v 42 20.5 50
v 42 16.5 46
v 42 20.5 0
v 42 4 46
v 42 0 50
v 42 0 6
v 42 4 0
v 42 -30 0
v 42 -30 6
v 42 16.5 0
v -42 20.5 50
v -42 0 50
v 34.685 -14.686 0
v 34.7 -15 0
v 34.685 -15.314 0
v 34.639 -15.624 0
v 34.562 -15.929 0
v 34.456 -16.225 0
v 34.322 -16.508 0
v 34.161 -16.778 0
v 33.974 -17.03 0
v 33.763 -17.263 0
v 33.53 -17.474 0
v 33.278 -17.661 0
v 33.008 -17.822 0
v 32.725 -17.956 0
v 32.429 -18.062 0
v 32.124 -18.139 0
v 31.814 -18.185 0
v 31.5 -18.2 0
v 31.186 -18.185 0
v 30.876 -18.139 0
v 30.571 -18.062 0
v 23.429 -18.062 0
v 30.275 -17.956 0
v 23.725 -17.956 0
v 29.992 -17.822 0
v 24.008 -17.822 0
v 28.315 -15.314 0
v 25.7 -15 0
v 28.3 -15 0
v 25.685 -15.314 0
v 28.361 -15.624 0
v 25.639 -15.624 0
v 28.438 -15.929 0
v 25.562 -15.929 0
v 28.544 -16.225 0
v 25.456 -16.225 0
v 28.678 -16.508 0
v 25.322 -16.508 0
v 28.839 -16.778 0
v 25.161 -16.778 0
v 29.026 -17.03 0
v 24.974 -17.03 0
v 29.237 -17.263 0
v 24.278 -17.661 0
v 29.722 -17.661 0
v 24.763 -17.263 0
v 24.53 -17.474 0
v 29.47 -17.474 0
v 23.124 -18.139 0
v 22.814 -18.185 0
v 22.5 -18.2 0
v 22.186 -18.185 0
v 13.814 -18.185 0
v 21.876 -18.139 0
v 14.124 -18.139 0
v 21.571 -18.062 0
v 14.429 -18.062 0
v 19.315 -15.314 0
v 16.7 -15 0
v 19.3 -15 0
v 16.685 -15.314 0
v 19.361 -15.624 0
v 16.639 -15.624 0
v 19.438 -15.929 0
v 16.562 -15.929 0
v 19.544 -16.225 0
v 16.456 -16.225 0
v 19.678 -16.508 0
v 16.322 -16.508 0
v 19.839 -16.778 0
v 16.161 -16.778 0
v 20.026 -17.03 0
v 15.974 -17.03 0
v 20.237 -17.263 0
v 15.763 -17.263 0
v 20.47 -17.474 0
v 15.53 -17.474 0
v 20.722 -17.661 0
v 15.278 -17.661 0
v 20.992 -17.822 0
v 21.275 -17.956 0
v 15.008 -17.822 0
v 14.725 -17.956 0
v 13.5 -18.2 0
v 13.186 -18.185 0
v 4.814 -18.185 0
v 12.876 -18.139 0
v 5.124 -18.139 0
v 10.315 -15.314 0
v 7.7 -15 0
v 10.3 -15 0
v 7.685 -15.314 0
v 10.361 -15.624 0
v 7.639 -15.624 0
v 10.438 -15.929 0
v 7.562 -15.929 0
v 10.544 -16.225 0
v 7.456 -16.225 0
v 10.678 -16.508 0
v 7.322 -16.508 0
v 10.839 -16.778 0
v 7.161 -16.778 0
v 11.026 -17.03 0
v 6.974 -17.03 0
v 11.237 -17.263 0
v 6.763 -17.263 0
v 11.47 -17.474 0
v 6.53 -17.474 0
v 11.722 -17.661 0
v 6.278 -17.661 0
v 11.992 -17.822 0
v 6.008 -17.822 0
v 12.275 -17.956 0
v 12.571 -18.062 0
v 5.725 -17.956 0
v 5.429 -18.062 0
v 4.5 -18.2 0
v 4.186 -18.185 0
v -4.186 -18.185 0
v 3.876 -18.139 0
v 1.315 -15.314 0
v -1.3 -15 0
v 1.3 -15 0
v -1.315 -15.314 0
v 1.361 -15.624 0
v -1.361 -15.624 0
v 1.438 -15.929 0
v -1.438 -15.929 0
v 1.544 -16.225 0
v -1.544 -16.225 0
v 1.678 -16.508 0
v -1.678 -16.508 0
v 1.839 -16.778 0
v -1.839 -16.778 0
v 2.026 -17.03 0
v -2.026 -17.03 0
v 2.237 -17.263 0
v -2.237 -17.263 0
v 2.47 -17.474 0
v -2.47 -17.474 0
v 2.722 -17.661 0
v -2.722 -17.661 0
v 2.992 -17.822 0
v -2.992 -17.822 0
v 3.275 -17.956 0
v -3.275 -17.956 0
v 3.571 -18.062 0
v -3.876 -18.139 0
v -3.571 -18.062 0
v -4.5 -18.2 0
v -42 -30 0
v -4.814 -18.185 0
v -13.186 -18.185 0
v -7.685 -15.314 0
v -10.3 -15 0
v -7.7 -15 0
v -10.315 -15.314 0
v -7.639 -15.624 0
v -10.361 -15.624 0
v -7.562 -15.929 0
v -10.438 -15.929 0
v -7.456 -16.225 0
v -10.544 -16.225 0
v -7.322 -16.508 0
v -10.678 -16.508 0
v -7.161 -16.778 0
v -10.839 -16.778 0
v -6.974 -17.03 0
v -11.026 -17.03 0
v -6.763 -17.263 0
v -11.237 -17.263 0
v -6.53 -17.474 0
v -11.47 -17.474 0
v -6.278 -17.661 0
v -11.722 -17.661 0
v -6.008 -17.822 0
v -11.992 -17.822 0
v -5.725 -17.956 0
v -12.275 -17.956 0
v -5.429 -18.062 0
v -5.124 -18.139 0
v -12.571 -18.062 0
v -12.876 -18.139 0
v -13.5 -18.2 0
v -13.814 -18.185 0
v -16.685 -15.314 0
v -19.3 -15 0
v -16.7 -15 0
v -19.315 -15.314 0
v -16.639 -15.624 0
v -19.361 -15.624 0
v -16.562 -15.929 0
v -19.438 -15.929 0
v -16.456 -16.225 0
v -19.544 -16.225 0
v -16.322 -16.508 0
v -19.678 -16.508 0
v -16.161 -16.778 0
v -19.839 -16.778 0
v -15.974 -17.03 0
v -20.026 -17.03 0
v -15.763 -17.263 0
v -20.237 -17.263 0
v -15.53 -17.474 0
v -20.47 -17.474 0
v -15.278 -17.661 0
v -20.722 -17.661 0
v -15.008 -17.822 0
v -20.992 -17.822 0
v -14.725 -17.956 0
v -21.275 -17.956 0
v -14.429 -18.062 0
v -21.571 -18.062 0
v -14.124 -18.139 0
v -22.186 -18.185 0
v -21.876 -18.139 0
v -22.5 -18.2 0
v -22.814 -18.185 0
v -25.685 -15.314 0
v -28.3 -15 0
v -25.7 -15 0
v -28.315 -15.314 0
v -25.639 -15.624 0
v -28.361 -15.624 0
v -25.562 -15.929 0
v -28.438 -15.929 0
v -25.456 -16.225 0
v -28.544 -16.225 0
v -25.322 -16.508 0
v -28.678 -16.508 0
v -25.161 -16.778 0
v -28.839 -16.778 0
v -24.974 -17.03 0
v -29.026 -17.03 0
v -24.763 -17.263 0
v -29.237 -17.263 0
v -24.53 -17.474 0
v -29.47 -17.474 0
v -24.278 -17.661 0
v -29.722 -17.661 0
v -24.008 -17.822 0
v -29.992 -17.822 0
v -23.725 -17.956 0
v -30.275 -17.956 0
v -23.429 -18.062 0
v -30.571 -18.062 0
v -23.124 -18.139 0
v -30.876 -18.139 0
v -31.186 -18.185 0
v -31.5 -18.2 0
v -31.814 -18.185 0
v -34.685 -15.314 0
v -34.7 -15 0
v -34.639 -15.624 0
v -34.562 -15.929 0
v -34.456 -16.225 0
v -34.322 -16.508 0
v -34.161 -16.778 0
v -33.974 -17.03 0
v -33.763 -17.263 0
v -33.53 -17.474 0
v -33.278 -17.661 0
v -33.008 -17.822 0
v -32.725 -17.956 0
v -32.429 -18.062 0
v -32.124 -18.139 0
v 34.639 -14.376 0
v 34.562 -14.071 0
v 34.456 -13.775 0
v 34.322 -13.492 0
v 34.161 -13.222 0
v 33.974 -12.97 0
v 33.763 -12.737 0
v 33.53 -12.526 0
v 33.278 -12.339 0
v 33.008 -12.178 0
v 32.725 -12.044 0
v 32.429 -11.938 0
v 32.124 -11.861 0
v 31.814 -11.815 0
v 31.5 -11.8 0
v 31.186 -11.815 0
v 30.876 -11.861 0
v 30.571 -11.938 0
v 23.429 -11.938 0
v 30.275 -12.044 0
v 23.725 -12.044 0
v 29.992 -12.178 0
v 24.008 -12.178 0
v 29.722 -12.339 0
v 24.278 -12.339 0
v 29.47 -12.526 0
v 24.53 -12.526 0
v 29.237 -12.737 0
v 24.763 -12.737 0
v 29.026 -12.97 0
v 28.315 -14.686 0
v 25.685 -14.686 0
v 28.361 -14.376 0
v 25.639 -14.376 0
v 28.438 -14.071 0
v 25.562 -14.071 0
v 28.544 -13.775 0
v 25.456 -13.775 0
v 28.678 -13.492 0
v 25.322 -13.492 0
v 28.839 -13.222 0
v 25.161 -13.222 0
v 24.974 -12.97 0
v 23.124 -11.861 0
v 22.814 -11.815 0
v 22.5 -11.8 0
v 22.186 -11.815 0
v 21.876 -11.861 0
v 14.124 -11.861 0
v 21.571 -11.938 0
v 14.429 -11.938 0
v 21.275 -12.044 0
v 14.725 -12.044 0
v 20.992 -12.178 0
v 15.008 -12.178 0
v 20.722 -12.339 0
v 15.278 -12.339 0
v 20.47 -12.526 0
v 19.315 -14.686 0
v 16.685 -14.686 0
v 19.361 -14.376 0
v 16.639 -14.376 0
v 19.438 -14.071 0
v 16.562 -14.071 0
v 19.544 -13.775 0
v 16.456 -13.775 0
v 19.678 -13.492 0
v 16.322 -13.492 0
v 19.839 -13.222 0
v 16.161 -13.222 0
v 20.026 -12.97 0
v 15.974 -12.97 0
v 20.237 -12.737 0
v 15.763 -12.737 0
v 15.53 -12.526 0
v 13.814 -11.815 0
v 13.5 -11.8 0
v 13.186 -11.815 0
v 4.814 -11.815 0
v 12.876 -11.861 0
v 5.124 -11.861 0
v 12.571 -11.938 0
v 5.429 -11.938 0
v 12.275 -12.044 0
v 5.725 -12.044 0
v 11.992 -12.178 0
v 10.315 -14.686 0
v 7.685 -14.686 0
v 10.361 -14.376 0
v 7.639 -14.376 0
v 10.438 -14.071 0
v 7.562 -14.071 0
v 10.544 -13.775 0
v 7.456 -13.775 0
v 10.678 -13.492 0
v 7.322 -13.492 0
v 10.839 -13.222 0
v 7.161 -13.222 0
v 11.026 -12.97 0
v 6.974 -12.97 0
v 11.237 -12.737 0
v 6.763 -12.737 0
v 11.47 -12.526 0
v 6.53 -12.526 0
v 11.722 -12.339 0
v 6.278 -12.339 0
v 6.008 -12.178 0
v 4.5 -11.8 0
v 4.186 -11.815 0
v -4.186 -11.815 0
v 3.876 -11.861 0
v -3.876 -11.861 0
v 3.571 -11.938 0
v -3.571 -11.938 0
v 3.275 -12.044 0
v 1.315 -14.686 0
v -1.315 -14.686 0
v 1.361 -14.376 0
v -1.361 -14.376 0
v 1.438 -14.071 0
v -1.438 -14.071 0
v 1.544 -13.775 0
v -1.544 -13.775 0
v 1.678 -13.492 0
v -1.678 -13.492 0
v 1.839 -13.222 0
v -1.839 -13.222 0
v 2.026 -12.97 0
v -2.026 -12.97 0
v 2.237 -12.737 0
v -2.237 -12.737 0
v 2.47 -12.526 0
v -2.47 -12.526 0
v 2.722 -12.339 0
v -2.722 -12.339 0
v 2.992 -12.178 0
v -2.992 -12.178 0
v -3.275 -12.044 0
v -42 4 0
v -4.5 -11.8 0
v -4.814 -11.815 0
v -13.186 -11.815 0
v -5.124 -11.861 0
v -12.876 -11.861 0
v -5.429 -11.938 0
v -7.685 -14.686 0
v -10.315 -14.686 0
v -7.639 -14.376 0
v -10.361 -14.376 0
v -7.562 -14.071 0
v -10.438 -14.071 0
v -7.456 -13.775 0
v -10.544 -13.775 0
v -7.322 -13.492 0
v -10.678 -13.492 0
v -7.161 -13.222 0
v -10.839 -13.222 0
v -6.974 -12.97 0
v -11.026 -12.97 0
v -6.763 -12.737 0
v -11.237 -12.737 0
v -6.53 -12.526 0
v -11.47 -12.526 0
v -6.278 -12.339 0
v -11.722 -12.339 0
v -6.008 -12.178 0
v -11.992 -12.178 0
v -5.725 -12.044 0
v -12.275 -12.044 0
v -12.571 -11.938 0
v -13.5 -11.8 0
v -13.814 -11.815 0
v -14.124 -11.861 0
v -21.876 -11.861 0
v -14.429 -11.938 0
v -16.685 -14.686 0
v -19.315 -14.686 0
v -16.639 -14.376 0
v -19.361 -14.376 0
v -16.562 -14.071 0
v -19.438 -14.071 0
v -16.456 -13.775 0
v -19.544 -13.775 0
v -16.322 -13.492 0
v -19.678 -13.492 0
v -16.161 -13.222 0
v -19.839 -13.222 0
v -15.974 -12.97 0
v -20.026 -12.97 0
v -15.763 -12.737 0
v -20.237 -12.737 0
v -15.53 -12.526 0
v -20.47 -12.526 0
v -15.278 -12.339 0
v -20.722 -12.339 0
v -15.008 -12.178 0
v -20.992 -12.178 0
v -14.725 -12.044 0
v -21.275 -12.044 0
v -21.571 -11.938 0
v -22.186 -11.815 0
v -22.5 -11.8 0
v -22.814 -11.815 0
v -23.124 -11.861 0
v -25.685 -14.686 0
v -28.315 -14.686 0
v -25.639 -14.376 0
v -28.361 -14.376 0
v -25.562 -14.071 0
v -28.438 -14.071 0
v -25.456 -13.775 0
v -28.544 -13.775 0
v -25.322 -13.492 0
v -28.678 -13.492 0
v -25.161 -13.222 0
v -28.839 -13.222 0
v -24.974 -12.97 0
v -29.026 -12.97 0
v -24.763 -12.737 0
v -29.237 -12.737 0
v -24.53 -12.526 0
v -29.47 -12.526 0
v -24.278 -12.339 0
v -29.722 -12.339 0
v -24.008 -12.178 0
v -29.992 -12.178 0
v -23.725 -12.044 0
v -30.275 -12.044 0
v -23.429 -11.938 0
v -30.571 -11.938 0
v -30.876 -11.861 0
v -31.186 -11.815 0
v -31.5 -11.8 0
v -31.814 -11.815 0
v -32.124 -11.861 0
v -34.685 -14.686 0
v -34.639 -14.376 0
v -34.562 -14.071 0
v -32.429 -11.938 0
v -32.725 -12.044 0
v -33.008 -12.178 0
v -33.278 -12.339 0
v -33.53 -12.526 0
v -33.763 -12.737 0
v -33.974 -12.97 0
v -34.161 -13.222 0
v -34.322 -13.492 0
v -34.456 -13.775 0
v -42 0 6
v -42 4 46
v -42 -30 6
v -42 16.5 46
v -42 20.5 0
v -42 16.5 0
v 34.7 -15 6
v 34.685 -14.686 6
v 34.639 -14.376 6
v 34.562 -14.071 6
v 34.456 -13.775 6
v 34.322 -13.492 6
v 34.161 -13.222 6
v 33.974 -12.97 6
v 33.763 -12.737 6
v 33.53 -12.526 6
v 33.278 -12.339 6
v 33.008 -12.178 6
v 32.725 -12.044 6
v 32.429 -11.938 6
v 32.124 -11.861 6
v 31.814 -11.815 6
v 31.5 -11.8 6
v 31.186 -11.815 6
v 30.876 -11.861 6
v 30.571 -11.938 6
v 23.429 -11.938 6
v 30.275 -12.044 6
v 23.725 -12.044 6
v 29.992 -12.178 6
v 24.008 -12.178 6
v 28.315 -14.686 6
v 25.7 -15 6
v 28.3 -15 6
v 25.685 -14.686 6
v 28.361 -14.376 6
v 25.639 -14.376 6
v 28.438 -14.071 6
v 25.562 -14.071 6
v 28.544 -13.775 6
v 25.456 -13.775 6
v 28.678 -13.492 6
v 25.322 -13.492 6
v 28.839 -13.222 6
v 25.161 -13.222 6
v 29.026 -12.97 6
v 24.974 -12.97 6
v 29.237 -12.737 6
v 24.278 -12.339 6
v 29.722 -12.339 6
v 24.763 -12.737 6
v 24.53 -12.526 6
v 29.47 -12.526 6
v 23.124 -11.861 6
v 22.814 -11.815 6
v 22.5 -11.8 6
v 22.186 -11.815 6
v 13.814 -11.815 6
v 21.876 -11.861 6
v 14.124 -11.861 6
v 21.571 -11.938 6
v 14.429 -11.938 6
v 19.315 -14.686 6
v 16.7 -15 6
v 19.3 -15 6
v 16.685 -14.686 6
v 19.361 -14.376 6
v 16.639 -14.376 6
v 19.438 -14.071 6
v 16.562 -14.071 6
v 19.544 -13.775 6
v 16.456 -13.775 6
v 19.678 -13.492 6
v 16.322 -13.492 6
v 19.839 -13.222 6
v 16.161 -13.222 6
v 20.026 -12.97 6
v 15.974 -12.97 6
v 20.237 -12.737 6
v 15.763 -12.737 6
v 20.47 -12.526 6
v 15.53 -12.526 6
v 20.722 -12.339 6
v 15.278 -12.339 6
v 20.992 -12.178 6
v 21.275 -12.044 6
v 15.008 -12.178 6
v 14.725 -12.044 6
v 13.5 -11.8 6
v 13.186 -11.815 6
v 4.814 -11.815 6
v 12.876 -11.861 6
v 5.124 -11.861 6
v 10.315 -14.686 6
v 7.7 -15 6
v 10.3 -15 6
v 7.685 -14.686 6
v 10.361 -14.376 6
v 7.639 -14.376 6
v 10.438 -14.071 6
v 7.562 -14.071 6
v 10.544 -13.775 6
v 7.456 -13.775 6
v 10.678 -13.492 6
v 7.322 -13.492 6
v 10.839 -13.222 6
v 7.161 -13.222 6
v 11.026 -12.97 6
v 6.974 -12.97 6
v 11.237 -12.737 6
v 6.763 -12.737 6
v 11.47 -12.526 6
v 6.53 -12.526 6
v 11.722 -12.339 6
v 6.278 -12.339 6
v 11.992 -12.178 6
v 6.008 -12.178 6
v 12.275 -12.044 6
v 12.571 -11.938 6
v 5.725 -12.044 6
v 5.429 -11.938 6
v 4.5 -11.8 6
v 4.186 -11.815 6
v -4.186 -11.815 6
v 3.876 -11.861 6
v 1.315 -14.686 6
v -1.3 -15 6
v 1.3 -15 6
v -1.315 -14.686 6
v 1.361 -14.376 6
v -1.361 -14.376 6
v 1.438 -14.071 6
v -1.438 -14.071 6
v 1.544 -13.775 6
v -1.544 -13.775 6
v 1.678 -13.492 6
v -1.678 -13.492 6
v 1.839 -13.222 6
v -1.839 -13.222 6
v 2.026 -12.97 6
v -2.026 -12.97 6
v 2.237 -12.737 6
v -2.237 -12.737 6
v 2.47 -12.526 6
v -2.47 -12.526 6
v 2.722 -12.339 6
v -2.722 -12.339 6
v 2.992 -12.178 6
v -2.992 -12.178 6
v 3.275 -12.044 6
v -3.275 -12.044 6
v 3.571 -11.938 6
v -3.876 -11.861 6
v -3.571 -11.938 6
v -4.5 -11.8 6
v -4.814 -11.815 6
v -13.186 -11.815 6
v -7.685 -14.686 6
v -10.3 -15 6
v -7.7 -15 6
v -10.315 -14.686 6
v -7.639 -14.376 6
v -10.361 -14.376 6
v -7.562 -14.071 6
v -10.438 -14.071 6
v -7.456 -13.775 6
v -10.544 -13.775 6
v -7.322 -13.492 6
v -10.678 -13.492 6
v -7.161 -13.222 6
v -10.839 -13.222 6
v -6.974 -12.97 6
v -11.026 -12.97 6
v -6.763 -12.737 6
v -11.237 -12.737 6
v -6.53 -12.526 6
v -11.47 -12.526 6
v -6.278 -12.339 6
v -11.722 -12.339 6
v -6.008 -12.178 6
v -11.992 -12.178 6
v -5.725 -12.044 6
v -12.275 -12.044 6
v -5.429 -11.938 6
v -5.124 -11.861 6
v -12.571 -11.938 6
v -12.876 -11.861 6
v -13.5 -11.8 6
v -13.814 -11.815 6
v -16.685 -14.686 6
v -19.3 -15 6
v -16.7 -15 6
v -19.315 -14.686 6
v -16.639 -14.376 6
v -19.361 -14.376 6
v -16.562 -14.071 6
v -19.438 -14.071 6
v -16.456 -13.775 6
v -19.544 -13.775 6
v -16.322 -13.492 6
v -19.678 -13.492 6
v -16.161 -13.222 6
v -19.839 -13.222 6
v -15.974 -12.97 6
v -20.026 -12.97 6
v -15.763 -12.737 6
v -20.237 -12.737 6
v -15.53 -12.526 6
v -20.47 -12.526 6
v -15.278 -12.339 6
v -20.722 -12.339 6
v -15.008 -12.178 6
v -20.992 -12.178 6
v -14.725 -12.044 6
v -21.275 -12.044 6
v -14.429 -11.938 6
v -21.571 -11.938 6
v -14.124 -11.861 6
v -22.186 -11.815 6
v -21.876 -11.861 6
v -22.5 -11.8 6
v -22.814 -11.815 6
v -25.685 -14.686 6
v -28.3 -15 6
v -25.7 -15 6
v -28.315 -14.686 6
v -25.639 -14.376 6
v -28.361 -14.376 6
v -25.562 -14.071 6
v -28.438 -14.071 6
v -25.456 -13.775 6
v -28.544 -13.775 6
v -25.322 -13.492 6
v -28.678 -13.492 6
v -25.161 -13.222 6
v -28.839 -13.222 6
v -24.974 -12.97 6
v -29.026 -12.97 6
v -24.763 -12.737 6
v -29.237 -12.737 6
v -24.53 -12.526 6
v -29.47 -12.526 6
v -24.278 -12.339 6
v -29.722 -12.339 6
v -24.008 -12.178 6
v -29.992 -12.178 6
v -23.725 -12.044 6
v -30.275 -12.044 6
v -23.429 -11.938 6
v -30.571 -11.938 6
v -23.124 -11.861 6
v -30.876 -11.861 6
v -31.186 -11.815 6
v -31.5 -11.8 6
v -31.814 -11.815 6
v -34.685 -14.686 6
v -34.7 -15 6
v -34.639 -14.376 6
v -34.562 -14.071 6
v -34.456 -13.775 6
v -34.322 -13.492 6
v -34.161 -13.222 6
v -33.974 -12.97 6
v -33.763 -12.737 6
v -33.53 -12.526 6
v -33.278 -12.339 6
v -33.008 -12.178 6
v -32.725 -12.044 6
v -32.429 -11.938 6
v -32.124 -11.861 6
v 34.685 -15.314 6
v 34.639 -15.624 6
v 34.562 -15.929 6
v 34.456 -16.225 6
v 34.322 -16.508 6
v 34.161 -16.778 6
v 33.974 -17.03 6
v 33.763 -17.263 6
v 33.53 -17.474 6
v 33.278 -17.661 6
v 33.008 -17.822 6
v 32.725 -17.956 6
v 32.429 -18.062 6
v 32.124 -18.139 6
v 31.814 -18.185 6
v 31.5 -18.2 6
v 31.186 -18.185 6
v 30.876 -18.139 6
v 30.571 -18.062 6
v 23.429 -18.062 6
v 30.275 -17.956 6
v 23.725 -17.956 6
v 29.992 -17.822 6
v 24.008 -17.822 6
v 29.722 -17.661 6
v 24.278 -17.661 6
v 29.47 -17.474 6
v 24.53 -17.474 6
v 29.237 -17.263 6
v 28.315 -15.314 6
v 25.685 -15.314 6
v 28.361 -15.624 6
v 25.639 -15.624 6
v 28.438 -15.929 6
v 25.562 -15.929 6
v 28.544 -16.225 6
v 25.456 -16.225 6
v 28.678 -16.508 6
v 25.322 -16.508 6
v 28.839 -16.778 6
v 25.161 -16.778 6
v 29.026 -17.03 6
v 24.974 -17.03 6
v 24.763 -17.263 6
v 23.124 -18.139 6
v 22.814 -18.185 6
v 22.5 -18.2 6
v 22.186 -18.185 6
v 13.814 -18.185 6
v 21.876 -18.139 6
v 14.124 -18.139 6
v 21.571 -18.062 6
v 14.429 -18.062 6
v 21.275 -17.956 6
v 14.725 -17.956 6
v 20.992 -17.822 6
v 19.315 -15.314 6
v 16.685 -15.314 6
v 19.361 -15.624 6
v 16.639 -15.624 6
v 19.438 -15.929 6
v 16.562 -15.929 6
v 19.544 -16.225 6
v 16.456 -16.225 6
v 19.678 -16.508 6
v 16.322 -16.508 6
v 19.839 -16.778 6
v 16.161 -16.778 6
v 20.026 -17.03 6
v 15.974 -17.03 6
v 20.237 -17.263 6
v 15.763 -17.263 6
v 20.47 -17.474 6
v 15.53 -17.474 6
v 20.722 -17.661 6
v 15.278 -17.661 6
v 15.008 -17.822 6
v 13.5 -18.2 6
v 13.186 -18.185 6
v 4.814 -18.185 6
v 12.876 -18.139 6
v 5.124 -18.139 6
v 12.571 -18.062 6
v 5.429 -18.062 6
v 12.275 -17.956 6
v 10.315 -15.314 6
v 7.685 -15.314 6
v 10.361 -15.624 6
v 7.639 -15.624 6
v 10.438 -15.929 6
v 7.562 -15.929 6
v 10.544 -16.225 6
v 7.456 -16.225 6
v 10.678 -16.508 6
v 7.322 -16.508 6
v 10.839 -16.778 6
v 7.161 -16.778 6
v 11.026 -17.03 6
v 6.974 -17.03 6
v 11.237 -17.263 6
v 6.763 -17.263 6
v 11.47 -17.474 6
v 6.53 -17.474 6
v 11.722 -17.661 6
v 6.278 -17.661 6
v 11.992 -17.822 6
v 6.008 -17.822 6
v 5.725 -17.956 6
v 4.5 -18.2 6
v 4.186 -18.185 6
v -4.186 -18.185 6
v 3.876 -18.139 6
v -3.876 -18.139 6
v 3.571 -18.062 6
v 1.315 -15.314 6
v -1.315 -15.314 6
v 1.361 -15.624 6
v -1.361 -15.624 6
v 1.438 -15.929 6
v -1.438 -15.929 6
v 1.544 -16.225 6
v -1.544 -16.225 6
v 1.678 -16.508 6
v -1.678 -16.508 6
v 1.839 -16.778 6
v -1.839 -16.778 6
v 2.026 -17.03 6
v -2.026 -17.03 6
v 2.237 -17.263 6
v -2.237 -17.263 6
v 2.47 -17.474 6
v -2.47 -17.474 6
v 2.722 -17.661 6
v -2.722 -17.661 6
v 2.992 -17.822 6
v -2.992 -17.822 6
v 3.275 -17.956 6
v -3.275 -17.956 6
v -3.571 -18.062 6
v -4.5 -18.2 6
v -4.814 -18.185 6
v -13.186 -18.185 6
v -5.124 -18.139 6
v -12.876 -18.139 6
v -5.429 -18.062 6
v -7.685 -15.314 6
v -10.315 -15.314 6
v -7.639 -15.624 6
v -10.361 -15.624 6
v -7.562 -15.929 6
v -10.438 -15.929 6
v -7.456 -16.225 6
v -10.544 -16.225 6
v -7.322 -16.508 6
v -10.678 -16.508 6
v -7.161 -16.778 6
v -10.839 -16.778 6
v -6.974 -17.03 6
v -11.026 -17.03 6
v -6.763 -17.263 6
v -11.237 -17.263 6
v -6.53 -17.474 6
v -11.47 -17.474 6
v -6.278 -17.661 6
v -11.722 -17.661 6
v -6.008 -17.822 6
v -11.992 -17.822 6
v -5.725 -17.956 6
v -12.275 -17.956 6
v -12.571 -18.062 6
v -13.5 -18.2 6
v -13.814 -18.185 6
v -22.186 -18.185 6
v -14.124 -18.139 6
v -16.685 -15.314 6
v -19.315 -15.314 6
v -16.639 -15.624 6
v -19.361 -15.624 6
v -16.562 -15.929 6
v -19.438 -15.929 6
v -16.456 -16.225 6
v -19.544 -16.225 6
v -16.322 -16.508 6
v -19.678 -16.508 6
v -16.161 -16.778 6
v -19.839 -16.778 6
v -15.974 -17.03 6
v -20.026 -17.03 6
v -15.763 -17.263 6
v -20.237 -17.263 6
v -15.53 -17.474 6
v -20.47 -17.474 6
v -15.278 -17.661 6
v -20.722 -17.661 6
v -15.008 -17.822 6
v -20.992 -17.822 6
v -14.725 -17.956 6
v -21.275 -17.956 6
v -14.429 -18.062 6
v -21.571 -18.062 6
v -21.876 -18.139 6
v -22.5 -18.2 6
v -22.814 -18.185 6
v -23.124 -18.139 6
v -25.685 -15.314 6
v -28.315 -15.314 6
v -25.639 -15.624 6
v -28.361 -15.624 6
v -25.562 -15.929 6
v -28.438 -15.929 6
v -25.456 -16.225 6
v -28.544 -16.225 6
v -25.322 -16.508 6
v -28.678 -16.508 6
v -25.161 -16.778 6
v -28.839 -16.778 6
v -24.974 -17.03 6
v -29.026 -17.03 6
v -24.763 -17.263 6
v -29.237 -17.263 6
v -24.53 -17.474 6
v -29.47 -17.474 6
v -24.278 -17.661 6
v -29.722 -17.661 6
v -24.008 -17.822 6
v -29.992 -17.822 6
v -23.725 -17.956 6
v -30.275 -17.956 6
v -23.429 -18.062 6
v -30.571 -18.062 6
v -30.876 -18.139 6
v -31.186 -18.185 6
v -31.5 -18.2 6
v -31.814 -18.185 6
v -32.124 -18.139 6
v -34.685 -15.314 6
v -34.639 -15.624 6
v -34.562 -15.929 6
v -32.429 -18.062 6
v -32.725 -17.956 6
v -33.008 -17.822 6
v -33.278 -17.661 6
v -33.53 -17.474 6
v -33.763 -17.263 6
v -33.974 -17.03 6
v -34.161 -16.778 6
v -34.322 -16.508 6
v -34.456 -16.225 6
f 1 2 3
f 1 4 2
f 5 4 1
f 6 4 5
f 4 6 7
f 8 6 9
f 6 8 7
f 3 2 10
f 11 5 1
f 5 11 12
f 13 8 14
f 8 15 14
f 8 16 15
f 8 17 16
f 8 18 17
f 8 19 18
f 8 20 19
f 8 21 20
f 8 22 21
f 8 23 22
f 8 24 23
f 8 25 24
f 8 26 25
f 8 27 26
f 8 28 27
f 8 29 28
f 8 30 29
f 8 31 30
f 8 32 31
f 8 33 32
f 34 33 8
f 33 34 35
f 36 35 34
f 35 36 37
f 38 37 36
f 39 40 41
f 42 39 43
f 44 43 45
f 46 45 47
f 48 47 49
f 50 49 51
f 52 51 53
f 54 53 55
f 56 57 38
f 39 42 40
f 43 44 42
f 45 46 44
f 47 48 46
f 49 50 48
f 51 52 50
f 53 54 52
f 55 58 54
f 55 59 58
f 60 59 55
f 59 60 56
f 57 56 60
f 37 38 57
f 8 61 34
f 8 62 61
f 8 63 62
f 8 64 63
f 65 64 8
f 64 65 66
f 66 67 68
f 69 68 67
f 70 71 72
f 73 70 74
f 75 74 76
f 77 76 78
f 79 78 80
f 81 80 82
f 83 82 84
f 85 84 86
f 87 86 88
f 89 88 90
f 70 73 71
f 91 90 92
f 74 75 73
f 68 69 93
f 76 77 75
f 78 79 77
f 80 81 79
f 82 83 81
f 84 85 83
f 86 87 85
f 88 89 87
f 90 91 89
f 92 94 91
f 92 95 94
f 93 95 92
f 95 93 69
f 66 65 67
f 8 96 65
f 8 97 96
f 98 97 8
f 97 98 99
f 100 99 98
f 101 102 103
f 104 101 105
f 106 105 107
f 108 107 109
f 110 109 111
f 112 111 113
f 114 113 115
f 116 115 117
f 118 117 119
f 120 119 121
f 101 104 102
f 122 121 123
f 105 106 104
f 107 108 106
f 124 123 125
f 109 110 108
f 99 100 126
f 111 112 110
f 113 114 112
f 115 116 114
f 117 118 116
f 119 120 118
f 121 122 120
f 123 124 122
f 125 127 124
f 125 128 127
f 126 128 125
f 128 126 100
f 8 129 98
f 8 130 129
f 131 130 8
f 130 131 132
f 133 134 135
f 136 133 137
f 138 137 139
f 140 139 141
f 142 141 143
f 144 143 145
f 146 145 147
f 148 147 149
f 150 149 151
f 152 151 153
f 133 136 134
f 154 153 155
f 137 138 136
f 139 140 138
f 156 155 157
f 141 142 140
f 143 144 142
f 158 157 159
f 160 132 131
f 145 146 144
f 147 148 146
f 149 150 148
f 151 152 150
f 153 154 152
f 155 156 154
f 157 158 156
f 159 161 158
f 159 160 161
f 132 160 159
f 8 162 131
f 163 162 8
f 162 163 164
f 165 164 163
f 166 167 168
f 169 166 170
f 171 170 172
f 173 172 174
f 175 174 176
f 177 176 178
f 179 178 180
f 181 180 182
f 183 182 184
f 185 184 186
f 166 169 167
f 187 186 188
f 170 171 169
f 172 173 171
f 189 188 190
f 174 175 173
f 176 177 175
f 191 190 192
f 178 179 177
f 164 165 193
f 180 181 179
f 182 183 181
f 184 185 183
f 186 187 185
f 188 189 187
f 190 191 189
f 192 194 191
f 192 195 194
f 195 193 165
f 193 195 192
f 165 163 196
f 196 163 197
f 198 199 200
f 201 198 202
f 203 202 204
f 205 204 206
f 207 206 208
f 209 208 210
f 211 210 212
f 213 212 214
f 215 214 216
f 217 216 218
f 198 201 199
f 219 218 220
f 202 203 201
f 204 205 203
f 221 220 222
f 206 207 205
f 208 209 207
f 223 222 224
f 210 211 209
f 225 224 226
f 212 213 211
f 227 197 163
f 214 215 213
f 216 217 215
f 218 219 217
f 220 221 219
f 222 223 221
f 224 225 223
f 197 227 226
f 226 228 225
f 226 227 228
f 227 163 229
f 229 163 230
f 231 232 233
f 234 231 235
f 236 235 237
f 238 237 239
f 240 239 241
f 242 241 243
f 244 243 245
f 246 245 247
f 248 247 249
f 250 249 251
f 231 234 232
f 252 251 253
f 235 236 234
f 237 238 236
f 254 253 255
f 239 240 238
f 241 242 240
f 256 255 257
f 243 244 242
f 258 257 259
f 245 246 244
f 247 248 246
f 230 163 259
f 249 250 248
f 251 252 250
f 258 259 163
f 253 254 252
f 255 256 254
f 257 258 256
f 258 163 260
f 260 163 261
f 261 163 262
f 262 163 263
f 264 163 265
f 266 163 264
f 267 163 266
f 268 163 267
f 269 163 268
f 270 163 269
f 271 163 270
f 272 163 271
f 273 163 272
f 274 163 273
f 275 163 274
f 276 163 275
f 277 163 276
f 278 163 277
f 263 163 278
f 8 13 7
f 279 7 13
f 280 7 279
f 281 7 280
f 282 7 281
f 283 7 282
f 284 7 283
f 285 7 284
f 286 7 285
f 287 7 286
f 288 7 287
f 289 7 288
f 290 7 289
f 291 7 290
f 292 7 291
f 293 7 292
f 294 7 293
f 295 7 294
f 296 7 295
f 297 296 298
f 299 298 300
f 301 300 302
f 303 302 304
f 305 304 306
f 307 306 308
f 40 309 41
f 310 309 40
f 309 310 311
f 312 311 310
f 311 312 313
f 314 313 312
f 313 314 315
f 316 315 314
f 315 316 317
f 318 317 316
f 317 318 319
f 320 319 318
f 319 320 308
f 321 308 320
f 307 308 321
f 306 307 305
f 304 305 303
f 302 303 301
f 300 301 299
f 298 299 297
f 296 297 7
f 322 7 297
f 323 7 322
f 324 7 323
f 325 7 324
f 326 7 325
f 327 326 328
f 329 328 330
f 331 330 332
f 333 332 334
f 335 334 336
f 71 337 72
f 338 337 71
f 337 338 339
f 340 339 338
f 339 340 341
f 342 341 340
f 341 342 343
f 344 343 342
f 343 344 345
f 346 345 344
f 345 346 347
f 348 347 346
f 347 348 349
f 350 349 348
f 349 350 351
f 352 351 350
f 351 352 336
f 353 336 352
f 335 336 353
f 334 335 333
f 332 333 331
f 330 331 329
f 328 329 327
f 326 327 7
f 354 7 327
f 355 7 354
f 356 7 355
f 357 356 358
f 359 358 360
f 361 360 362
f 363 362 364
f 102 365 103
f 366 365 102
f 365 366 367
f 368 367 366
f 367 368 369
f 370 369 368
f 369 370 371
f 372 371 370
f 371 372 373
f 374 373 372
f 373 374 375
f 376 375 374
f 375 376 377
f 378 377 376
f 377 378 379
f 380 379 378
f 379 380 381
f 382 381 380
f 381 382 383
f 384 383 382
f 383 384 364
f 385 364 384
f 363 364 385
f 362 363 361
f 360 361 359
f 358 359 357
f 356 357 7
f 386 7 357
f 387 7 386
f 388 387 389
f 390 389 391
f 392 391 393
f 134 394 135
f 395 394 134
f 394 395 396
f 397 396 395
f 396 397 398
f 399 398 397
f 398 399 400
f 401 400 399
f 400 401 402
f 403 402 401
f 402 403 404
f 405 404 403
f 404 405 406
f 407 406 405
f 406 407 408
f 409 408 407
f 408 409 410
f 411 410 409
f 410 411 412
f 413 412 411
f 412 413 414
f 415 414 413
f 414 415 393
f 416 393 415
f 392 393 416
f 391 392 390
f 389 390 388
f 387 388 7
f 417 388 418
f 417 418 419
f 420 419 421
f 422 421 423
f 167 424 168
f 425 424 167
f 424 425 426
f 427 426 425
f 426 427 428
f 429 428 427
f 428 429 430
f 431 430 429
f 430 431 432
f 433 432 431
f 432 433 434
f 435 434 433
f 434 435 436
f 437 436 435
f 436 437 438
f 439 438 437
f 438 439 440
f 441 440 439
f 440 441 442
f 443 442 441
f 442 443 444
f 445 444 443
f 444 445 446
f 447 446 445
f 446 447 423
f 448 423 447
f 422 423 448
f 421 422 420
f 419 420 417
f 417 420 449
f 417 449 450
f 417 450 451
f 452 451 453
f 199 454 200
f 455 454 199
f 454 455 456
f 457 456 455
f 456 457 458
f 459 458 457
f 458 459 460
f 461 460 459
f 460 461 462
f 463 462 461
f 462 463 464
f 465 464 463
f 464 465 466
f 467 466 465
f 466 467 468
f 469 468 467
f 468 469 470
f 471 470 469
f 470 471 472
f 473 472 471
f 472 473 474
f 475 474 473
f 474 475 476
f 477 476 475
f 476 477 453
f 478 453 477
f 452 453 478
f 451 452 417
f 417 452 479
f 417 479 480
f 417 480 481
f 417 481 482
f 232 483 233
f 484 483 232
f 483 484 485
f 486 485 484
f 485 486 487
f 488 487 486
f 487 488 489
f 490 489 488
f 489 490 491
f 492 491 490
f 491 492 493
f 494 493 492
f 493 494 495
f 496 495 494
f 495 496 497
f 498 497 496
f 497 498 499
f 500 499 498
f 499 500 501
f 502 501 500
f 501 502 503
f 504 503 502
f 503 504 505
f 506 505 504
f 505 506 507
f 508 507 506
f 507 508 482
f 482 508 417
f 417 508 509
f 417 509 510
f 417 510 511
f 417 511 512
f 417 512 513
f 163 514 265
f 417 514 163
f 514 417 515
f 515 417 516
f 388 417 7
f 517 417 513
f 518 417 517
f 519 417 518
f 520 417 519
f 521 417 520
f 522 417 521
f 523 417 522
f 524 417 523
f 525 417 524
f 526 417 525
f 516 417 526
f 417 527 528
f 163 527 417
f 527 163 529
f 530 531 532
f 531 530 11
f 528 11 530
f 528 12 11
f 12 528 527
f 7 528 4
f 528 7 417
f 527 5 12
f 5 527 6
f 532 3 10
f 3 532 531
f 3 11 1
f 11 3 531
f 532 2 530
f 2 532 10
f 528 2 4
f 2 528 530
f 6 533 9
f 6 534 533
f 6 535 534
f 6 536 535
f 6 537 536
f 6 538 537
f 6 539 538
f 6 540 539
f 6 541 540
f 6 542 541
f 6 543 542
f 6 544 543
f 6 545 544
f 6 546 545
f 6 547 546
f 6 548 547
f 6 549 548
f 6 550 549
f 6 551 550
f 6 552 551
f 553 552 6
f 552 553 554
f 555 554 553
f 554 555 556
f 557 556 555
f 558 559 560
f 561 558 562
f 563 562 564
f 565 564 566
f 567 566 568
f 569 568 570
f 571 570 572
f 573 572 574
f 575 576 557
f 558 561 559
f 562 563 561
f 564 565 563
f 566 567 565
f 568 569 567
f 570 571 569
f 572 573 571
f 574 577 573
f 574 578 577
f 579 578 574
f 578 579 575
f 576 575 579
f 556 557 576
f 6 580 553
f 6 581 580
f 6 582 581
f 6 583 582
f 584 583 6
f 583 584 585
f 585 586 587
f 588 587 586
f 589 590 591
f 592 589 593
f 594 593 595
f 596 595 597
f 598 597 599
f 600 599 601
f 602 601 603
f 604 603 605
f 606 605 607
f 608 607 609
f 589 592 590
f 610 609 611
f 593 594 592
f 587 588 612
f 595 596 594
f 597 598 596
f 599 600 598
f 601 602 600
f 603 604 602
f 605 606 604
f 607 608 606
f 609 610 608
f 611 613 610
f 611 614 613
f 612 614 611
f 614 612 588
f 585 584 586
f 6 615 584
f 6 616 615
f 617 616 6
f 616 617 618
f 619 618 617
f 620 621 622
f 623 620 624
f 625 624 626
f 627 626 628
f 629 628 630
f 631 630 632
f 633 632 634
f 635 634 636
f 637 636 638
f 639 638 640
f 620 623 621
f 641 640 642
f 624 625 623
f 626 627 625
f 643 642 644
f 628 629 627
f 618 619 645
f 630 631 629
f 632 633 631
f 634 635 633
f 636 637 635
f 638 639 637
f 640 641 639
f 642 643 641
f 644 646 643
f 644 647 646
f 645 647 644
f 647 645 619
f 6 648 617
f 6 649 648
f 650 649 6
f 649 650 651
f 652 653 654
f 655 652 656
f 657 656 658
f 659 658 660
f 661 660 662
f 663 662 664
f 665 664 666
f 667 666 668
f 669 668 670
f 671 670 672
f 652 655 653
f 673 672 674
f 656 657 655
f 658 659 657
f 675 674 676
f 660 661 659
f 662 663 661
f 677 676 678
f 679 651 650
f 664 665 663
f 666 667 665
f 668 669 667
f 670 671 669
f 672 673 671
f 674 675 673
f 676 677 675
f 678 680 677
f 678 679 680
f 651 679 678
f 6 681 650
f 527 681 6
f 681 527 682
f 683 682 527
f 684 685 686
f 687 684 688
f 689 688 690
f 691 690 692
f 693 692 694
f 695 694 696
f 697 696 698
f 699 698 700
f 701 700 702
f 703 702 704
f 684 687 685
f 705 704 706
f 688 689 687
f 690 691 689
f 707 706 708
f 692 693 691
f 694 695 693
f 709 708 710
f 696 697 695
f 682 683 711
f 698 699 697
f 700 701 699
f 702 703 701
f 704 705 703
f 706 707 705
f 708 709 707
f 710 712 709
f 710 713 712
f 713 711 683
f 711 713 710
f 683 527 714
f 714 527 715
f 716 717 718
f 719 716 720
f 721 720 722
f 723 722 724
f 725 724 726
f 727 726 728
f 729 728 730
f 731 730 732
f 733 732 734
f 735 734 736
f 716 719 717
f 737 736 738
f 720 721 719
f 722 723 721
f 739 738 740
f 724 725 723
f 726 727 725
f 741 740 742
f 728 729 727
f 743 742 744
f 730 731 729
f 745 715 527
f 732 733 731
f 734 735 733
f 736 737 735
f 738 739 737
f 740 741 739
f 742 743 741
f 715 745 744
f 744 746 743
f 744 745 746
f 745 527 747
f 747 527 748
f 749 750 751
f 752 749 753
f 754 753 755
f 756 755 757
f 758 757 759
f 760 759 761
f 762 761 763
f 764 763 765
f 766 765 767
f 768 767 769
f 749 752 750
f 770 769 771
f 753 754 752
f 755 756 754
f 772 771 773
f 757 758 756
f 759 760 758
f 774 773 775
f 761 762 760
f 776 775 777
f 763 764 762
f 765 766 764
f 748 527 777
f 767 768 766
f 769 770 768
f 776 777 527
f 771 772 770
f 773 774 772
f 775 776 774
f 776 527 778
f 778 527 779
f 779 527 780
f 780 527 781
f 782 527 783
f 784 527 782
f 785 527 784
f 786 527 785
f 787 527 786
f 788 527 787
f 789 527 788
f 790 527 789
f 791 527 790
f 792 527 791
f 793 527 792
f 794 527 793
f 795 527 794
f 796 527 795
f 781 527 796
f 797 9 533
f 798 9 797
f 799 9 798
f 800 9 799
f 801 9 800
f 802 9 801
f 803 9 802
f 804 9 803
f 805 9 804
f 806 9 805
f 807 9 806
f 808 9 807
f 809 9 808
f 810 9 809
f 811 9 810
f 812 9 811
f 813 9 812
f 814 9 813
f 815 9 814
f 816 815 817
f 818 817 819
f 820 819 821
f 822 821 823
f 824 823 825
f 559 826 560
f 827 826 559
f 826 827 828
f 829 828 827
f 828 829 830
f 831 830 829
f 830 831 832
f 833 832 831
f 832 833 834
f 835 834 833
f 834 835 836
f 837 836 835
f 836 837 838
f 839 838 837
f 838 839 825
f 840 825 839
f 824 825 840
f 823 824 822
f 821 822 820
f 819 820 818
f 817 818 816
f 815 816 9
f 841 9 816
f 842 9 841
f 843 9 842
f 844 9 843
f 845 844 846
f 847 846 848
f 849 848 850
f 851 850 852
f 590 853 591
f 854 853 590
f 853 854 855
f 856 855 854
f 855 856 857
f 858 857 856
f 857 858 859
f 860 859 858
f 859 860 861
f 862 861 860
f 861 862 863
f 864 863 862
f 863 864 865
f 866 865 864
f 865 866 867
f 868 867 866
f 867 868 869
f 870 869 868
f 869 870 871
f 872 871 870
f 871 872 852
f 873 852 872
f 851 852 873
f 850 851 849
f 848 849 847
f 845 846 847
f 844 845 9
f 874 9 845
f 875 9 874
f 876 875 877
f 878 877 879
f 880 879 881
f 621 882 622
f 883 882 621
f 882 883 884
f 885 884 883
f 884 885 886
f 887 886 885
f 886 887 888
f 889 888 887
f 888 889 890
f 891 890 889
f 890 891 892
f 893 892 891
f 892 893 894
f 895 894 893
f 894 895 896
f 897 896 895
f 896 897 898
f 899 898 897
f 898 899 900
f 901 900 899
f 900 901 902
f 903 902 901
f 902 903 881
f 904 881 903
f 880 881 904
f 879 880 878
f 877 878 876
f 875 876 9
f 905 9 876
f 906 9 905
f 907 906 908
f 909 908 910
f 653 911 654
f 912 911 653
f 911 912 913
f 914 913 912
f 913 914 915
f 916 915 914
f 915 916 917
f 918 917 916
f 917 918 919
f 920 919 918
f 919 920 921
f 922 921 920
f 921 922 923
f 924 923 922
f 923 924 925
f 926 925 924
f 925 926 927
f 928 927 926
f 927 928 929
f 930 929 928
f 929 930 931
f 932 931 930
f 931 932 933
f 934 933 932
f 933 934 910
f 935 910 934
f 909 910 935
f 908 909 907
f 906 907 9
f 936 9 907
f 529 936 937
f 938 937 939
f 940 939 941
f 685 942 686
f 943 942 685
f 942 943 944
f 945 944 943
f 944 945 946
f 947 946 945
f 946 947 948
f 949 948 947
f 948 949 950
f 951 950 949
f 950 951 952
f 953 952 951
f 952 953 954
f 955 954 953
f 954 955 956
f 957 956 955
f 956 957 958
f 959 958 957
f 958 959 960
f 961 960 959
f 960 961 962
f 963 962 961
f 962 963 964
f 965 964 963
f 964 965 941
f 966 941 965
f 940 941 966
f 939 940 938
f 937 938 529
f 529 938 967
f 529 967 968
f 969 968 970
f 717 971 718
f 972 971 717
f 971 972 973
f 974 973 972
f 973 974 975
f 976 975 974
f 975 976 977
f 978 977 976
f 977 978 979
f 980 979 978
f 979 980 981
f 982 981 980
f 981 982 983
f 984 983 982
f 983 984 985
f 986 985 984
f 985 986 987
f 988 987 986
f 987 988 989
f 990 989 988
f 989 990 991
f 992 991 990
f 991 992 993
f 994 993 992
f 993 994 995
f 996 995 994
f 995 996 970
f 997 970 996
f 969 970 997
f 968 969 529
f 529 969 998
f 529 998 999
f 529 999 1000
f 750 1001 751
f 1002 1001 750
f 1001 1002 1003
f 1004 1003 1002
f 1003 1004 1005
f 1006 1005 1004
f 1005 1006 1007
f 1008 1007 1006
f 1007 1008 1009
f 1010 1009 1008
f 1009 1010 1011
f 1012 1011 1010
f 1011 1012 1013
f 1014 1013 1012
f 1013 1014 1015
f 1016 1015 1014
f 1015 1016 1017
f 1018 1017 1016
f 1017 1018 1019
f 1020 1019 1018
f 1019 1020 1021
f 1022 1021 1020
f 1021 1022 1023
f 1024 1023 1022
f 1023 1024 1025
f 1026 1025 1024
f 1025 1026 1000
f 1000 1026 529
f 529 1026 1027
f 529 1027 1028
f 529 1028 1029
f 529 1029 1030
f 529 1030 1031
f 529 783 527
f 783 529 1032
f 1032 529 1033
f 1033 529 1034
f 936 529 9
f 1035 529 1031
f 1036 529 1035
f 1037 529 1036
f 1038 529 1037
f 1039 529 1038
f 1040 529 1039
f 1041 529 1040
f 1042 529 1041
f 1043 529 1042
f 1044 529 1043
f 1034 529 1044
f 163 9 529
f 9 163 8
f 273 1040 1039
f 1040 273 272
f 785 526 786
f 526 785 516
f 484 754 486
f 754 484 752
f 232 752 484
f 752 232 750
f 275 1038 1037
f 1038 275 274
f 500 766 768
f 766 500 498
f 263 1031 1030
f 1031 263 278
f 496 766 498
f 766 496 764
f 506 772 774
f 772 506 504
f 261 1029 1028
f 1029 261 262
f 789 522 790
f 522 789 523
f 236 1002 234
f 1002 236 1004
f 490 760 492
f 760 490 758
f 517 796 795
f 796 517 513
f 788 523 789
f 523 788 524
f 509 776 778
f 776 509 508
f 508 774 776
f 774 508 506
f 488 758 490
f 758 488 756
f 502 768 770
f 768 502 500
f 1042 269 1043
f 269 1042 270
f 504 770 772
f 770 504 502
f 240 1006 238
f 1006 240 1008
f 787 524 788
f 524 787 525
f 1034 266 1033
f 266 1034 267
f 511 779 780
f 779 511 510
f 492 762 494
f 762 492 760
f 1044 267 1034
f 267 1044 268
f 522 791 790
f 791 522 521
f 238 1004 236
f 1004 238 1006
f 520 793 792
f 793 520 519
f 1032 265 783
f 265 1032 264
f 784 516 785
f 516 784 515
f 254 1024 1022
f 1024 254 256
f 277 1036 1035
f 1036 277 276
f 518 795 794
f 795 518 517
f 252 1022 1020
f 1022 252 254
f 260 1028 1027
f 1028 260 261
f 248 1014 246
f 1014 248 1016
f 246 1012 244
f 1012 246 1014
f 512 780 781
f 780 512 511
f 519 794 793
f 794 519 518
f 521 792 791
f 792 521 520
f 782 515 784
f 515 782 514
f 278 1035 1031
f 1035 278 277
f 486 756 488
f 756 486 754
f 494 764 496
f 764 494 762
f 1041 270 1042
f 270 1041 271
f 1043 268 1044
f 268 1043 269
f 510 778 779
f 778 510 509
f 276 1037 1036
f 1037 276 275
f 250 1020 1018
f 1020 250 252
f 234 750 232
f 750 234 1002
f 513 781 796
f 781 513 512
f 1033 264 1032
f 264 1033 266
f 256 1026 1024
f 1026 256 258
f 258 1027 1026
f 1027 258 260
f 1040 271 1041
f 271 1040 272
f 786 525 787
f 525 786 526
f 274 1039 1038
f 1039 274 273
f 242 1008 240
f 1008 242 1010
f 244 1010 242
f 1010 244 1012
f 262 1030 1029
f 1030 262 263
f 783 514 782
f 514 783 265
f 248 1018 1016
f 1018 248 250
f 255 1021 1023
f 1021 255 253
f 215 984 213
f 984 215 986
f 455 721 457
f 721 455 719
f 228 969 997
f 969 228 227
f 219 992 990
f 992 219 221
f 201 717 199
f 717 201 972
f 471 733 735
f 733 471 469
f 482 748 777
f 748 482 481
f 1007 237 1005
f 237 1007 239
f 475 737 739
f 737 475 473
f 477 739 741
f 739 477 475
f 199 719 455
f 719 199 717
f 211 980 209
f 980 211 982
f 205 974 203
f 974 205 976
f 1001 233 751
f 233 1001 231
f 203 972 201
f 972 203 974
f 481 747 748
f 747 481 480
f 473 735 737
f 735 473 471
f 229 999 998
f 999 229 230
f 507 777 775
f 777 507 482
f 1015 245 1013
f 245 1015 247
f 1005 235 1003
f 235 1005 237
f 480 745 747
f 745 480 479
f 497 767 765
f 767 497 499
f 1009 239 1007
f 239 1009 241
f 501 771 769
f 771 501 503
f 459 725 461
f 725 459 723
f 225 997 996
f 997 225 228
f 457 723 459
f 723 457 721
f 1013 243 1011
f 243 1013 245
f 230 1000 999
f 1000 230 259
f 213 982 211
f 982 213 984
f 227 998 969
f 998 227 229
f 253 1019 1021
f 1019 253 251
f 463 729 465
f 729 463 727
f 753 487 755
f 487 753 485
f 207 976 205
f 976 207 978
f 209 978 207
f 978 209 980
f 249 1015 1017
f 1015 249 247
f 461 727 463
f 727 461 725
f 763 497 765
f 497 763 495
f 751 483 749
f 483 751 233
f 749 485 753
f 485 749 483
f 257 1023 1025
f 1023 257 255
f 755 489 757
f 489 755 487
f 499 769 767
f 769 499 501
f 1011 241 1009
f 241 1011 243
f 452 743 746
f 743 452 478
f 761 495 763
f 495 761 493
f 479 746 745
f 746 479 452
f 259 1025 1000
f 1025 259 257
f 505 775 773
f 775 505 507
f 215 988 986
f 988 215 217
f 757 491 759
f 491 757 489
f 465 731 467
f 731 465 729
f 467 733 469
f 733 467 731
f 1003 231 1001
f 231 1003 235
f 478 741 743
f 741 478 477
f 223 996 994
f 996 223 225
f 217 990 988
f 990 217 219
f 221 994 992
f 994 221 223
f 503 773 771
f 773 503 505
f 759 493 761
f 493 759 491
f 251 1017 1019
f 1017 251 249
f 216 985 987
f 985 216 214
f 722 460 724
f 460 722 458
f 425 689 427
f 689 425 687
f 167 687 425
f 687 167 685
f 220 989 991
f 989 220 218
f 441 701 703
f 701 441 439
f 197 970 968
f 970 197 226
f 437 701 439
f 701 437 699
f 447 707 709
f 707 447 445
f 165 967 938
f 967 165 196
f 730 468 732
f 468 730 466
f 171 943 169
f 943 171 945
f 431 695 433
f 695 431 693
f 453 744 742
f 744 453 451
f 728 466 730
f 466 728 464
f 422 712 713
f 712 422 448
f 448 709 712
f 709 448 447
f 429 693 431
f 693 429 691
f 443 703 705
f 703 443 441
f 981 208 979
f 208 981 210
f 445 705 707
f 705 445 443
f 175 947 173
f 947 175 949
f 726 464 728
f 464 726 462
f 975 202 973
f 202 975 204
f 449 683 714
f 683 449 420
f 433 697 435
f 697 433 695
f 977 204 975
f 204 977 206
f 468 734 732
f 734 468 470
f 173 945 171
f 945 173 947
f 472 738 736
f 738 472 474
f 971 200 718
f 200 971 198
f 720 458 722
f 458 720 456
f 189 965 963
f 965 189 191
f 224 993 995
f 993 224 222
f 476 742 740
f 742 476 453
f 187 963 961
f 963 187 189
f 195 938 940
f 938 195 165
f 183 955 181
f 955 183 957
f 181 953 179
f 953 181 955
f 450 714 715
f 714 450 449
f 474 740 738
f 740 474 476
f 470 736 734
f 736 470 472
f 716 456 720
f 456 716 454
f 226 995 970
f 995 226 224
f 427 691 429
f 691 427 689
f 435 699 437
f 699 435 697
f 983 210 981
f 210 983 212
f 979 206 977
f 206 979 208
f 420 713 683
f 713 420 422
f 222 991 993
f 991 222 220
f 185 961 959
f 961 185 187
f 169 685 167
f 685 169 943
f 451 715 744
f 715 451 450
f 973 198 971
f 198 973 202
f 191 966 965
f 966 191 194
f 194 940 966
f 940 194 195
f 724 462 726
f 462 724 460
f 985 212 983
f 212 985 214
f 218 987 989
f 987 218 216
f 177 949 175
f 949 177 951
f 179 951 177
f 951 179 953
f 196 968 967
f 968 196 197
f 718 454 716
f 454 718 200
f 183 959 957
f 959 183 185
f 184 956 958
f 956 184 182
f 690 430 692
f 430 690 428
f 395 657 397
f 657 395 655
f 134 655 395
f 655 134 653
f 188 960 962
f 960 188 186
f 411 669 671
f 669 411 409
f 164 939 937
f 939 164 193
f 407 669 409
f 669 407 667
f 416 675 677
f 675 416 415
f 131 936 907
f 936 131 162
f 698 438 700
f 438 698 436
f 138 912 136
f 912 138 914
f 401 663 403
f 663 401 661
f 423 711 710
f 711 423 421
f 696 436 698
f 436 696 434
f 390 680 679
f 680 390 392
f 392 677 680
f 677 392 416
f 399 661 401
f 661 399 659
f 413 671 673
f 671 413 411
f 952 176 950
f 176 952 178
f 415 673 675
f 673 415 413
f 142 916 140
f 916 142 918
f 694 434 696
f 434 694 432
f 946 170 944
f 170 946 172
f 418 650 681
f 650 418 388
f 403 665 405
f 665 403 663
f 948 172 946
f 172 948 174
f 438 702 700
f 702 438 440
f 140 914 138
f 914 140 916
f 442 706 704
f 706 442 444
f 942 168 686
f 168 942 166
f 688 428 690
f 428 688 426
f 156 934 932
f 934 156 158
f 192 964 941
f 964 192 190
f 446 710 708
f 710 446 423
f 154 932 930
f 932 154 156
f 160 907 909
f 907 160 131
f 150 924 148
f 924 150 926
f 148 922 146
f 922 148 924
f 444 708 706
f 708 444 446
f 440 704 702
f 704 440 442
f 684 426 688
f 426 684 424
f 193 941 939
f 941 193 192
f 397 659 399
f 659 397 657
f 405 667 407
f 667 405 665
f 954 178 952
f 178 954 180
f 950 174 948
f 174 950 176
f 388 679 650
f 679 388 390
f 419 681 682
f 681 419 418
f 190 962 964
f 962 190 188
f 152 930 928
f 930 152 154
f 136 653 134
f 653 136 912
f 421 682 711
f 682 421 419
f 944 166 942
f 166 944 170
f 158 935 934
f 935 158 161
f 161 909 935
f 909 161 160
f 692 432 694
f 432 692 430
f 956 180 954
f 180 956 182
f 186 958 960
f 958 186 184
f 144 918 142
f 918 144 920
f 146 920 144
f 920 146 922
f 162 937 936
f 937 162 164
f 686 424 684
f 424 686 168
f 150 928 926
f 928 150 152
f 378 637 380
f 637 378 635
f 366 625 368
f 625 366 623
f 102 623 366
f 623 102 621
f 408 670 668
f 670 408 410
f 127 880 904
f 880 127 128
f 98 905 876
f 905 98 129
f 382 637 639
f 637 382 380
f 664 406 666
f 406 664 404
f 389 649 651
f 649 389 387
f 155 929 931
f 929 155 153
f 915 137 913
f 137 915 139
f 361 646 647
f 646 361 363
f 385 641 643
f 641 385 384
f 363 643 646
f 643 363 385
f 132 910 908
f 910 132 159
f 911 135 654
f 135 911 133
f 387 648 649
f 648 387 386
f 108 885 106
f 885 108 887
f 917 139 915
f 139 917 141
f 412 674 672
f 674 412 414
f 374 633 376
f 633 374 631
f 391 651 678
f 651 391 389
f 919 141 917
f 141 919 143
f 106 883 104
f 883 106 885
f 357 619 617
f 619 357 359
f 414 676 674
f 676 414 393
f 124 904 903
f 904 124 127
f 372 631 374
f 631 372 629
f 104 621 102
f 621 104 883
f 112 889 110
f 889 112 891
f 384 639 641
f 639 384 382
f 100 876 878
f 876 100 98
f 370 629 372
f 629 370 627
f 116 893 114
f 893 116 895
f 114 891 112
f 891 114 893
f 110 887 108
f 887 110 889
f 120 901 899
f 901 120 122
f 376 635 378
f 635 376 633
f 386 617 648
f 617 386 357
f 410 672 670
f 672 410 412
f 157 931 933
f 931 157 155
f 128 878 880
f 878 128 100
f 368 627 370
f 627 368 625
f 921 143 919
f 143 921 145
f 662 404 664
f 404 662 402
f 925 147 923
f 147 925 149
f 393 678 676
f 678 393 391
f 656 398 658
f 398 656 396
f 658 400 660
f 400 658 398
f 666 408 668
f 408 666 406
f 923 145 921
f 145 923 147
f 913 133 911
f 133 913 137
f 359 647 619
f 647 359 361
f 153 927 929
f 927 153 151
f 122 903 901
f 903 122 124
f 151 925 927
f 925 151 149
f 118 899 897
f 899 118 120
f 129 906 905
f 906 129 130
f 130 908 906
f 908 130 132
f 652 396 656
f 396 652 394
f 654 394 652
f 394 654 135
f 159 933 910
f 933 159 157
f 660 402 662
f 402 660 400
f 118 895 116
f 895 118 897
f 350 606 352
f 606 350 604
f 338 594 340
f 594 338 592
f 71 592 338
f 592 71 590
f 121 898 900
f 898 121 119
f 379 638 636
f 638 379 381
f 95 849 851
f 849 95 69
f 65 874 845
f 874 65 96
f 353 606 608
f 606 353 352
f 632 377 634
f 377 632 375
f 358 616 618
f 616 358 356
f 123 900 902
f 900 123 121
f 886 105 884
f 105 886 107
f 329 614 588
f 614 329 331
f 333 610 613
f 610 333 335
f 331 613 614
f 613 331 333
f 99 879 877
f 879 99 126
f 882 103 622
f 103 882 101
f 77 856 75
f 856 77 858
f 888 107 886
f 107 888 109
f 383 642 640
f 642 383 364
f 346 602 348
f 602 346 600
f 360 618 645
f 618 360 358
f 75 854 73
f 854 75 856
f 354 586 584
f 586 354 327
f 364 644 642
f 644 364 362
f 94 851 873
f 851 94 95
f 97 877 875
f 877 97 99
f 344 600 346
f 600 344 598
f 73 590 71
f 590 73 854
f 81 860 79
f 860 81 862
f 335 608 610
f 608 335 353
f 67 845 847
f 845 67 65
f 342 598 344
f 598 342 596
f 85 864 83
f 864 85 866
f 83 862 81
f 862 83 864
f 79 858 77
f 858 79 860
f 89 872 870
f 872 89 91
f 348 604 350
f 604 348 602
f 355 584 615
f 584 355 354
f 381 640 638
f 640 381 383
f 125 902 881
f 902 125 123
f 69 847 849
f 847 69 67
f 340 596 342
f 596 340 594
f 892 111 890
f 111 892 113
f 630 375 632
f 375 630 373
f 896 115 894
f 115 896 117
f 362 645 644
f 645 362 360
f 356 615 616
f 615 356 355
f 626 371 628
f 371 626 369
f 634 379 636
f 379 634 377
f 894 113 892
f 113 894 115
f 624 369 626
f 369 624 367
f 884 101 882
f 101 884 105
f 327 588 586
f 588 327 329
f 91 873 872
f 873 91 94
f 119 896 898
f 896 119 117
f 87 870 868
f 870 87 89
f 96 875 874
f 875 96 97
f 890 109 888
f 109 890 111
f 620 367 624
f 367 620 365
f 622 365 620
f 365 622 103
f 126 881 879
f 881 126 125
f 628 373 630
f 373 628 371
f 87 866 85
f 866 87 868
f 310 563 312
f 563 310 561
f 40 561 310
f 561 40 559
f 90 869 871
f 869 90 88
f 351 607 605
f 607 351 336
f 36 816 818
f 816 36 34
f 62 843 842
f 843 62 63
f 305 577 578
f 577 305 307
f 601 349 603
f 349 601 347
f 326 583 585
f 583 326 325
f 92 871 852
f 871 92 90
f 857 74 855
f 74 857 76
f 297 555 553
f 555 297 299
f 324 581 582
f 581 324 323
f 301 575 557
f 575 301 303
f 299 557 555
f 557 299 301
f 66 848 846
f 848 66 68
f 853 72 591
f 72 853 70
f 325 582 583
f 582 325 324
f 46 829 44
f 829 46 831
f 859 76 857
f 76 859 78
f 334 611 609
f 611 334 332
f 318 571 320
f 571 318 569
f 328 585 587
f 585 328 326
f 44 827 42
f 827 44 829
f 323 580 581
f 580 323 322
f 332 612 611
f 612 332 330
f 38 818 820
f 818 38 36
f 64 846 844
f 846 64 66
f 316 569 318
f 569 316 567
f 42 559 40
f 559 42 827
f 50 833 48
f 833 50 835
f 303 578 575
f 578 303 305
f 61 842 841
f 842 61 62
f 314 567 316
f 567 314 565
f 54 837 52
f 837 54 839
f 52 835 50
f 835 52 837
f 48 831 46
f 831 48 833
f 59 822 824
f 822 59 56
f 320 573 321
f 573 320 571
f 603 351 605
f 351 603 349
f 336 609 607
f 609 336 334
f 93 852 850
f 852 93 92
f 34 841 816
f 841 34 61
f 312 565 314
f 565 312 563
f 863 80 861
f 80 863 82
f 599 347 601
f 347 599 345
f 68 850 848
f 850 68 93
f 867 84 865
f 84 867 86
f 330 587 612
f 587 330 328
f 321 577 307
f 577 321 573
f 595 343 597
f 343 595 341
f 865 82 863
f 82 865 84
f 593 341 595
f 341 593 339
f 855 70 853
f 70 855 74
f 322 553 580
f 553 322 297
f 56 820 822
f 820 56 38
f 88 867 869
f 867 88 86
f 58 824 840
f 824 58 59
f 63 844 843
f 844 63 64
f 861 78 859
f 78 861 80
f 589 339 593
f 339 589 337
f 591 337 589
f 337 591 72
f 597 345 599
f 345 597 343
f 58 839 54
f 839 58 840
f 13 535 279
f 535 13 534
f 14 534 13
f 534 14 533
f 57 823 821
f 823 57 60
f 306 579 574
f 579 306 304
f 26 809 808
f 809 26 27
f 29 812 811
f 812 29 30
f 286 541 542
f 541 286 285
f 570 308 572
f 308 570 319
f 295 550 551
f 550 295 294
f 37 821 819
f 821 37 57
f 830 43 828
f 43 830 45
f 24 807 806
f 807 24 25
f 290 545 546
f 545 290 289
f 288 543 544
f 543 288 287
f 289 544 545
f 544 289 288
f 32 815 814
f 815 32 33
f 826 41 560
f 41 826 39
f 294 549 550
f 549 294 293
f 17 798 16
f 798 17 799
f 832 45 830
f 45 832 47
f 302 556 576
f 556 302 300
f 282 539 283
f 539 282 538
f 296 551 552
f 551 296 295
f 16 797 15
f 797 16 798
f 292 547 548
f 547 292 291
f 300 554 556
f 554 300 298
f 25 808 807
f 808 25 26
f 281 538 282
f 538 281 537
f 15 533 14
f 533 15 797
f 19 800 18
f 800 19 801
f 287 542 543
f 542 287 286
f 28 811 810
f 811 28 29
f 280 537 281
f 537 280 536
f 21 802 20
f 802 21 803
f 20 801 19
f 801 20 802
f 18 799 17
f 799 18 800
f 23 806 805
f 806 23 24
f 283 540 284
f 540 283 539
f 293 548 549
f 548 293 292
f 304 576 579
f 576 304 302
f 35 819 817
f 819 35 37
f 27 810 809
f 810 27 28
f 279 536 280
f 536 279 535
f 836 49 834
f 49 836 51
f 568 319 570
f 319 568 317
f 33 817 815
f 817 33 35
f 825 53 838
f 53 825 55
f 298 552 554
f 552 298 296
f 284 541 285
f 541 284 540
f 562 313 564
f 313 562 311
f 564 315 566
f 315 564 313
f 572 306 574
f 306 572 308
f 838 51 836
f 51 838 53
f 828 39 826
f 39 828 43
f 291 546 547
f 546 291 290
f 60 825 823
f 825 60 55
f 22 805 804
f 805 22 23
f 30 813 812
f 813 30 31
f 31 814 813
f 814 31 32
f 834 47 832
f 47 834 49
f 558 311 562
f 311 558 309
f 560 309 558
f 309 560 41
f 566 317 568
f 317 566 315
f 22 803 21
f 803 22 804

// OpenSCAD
// PCR Strip Holder for Ice Bucket
// Units: mm

// Extrusion length (along X, centered at origin)
extrusion_length = 84;

// Inner leg (toward ice/inside bucket)
inner_leg_y_min = 0;
inner_leg_y_max = 4;
inner_leg_height = 50;

// Outer leg (outside bucket)
outer_leg_y_min = 16.5;
outer_leg_y_max = 20.5;
outer_leg_height = 50;

// Bridge at top (rests on bucket wall)
bridge_z_min = 46;
bridge_z_max = 50;

// Ledge (extends into ice, holds tubes)
ledge_y_min = -30;
ledge_y_max = 0;
ledge_thickness = 6;

// PCR tube holes (8 tubes, 9 mm apart, centered)
hole_diameter = 6.4;
hole_spacing = 9;
num_holes = 8;
hole_y = -15;

difference() {
    union() {
        // Inner leg
        translate([0, (inner_leg_y_min + inner_leg_y_max) / 2, inner_leg_height / 2]) {
            cube([extrusion_length, inner_leg_y_max - inner_leg_y_min, inner_leg_height], center = true);
        }
        
        // Outer leg
        translate([0, (outer_leg_y_min + outer_leg_y_max) / 2, outer_leg_height / 2]) {
            cube([extrusion_length, outer_leg_y_max - outer_leg_y_min, outer_leg_height], center = true);
        }
        
        // Bridge connecting legs at top
        translate([0, (inner_leg_y_max + outer_leg_y_min) / 2, (bridge_z_min + bridge_z_max) / 2]) {
            cube([extrusion_length, outer_leg_y_min - inner_leg_y_max, bridge_z_max - bridge_z_min], center = true);
        }
        
        // Ledge into ice
        translate([0, (ledge_y_min + ledge_y_max) / 2, ledge_thickness / 2]) {
            cube([extrusion_length, ledge_y_max - ledge_y_min, ledge_thickness], center = true);
        }
    }
    
    // Cut tube holes
    for (i = [0 : num_holes - 1]) {
        x_pos = (i - (num_holes - 1) / 2) * hole_spacing;
        translate([x_pos, hole_y, -0.01]) {
            cylinder(h = ledge_thickness + 0.02, r = hole_diameter / 2, $fn = 64);
        }
    }
}
